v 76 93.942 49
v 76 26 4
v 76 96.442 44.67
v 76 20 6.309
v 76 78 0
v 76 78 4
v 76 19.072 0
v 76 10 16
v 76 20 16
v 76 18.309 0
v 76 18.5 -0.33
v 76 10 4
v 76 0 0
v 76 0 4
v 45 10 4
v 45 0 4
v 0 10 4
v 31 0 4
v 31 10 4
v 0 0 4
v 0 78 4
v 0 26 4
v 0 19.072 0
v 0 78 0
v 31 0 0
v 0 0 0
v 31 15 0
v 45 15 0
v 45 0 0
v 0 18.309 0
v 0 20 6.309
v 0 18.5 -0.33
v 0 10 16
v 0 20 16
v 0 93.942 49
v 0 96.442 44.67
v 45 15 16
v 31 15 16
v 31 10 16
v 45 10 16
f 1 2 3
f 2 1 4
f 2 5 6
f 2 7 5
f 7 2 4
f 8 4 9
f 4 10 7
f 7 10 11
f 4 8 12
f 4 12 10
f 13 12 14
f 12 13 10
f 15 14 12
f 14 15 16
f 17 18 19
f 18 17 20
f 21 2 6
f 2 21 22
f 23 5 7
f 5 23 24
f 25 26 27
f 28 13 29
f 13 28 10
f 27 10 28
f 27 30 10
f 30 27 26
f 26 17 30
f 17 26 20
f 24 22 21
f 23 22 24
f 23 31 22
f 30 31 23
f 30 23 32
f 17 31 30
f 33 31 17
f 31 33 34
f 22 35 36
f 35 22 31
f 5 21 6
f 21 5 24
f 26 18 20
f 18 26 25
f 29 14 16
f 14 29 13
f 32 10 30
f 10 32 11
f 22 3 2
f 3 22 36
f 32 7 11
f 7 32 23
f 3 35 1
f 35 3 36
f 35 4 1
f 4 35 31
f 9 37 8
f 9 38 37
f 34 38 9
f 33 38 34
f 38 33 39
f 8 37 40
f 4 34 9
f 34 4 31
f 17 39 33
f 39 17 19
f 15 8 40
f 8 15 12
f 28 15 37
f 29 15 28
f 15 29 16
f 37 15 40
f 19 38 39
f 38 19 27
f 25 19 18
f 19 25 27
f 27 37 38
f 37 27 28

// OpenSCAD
// Example fixture: phone stand, ~iPhone 15 width, 60° tilt (mm)
$fn = 48;
phone_w = 76;
tilt = 60;
base_d = 78;
base_t = 4;
back_h = 90;
lip = 10;
cable = 14;

difference() {
  union() {
    cube([phone_w, base_d, base_t]);
    translate([0, 16, base_t])
      rotate([-tilt, 0, 0])
        cube([phone_w, 5, back_h]);
    translate([0, 10, base_t])
      cube([phone_w, lip, 12]);
  }
  translate([phone_w / 2 - cable / 2, -1, -1])
    cube([cable, 16, 20]);
}
